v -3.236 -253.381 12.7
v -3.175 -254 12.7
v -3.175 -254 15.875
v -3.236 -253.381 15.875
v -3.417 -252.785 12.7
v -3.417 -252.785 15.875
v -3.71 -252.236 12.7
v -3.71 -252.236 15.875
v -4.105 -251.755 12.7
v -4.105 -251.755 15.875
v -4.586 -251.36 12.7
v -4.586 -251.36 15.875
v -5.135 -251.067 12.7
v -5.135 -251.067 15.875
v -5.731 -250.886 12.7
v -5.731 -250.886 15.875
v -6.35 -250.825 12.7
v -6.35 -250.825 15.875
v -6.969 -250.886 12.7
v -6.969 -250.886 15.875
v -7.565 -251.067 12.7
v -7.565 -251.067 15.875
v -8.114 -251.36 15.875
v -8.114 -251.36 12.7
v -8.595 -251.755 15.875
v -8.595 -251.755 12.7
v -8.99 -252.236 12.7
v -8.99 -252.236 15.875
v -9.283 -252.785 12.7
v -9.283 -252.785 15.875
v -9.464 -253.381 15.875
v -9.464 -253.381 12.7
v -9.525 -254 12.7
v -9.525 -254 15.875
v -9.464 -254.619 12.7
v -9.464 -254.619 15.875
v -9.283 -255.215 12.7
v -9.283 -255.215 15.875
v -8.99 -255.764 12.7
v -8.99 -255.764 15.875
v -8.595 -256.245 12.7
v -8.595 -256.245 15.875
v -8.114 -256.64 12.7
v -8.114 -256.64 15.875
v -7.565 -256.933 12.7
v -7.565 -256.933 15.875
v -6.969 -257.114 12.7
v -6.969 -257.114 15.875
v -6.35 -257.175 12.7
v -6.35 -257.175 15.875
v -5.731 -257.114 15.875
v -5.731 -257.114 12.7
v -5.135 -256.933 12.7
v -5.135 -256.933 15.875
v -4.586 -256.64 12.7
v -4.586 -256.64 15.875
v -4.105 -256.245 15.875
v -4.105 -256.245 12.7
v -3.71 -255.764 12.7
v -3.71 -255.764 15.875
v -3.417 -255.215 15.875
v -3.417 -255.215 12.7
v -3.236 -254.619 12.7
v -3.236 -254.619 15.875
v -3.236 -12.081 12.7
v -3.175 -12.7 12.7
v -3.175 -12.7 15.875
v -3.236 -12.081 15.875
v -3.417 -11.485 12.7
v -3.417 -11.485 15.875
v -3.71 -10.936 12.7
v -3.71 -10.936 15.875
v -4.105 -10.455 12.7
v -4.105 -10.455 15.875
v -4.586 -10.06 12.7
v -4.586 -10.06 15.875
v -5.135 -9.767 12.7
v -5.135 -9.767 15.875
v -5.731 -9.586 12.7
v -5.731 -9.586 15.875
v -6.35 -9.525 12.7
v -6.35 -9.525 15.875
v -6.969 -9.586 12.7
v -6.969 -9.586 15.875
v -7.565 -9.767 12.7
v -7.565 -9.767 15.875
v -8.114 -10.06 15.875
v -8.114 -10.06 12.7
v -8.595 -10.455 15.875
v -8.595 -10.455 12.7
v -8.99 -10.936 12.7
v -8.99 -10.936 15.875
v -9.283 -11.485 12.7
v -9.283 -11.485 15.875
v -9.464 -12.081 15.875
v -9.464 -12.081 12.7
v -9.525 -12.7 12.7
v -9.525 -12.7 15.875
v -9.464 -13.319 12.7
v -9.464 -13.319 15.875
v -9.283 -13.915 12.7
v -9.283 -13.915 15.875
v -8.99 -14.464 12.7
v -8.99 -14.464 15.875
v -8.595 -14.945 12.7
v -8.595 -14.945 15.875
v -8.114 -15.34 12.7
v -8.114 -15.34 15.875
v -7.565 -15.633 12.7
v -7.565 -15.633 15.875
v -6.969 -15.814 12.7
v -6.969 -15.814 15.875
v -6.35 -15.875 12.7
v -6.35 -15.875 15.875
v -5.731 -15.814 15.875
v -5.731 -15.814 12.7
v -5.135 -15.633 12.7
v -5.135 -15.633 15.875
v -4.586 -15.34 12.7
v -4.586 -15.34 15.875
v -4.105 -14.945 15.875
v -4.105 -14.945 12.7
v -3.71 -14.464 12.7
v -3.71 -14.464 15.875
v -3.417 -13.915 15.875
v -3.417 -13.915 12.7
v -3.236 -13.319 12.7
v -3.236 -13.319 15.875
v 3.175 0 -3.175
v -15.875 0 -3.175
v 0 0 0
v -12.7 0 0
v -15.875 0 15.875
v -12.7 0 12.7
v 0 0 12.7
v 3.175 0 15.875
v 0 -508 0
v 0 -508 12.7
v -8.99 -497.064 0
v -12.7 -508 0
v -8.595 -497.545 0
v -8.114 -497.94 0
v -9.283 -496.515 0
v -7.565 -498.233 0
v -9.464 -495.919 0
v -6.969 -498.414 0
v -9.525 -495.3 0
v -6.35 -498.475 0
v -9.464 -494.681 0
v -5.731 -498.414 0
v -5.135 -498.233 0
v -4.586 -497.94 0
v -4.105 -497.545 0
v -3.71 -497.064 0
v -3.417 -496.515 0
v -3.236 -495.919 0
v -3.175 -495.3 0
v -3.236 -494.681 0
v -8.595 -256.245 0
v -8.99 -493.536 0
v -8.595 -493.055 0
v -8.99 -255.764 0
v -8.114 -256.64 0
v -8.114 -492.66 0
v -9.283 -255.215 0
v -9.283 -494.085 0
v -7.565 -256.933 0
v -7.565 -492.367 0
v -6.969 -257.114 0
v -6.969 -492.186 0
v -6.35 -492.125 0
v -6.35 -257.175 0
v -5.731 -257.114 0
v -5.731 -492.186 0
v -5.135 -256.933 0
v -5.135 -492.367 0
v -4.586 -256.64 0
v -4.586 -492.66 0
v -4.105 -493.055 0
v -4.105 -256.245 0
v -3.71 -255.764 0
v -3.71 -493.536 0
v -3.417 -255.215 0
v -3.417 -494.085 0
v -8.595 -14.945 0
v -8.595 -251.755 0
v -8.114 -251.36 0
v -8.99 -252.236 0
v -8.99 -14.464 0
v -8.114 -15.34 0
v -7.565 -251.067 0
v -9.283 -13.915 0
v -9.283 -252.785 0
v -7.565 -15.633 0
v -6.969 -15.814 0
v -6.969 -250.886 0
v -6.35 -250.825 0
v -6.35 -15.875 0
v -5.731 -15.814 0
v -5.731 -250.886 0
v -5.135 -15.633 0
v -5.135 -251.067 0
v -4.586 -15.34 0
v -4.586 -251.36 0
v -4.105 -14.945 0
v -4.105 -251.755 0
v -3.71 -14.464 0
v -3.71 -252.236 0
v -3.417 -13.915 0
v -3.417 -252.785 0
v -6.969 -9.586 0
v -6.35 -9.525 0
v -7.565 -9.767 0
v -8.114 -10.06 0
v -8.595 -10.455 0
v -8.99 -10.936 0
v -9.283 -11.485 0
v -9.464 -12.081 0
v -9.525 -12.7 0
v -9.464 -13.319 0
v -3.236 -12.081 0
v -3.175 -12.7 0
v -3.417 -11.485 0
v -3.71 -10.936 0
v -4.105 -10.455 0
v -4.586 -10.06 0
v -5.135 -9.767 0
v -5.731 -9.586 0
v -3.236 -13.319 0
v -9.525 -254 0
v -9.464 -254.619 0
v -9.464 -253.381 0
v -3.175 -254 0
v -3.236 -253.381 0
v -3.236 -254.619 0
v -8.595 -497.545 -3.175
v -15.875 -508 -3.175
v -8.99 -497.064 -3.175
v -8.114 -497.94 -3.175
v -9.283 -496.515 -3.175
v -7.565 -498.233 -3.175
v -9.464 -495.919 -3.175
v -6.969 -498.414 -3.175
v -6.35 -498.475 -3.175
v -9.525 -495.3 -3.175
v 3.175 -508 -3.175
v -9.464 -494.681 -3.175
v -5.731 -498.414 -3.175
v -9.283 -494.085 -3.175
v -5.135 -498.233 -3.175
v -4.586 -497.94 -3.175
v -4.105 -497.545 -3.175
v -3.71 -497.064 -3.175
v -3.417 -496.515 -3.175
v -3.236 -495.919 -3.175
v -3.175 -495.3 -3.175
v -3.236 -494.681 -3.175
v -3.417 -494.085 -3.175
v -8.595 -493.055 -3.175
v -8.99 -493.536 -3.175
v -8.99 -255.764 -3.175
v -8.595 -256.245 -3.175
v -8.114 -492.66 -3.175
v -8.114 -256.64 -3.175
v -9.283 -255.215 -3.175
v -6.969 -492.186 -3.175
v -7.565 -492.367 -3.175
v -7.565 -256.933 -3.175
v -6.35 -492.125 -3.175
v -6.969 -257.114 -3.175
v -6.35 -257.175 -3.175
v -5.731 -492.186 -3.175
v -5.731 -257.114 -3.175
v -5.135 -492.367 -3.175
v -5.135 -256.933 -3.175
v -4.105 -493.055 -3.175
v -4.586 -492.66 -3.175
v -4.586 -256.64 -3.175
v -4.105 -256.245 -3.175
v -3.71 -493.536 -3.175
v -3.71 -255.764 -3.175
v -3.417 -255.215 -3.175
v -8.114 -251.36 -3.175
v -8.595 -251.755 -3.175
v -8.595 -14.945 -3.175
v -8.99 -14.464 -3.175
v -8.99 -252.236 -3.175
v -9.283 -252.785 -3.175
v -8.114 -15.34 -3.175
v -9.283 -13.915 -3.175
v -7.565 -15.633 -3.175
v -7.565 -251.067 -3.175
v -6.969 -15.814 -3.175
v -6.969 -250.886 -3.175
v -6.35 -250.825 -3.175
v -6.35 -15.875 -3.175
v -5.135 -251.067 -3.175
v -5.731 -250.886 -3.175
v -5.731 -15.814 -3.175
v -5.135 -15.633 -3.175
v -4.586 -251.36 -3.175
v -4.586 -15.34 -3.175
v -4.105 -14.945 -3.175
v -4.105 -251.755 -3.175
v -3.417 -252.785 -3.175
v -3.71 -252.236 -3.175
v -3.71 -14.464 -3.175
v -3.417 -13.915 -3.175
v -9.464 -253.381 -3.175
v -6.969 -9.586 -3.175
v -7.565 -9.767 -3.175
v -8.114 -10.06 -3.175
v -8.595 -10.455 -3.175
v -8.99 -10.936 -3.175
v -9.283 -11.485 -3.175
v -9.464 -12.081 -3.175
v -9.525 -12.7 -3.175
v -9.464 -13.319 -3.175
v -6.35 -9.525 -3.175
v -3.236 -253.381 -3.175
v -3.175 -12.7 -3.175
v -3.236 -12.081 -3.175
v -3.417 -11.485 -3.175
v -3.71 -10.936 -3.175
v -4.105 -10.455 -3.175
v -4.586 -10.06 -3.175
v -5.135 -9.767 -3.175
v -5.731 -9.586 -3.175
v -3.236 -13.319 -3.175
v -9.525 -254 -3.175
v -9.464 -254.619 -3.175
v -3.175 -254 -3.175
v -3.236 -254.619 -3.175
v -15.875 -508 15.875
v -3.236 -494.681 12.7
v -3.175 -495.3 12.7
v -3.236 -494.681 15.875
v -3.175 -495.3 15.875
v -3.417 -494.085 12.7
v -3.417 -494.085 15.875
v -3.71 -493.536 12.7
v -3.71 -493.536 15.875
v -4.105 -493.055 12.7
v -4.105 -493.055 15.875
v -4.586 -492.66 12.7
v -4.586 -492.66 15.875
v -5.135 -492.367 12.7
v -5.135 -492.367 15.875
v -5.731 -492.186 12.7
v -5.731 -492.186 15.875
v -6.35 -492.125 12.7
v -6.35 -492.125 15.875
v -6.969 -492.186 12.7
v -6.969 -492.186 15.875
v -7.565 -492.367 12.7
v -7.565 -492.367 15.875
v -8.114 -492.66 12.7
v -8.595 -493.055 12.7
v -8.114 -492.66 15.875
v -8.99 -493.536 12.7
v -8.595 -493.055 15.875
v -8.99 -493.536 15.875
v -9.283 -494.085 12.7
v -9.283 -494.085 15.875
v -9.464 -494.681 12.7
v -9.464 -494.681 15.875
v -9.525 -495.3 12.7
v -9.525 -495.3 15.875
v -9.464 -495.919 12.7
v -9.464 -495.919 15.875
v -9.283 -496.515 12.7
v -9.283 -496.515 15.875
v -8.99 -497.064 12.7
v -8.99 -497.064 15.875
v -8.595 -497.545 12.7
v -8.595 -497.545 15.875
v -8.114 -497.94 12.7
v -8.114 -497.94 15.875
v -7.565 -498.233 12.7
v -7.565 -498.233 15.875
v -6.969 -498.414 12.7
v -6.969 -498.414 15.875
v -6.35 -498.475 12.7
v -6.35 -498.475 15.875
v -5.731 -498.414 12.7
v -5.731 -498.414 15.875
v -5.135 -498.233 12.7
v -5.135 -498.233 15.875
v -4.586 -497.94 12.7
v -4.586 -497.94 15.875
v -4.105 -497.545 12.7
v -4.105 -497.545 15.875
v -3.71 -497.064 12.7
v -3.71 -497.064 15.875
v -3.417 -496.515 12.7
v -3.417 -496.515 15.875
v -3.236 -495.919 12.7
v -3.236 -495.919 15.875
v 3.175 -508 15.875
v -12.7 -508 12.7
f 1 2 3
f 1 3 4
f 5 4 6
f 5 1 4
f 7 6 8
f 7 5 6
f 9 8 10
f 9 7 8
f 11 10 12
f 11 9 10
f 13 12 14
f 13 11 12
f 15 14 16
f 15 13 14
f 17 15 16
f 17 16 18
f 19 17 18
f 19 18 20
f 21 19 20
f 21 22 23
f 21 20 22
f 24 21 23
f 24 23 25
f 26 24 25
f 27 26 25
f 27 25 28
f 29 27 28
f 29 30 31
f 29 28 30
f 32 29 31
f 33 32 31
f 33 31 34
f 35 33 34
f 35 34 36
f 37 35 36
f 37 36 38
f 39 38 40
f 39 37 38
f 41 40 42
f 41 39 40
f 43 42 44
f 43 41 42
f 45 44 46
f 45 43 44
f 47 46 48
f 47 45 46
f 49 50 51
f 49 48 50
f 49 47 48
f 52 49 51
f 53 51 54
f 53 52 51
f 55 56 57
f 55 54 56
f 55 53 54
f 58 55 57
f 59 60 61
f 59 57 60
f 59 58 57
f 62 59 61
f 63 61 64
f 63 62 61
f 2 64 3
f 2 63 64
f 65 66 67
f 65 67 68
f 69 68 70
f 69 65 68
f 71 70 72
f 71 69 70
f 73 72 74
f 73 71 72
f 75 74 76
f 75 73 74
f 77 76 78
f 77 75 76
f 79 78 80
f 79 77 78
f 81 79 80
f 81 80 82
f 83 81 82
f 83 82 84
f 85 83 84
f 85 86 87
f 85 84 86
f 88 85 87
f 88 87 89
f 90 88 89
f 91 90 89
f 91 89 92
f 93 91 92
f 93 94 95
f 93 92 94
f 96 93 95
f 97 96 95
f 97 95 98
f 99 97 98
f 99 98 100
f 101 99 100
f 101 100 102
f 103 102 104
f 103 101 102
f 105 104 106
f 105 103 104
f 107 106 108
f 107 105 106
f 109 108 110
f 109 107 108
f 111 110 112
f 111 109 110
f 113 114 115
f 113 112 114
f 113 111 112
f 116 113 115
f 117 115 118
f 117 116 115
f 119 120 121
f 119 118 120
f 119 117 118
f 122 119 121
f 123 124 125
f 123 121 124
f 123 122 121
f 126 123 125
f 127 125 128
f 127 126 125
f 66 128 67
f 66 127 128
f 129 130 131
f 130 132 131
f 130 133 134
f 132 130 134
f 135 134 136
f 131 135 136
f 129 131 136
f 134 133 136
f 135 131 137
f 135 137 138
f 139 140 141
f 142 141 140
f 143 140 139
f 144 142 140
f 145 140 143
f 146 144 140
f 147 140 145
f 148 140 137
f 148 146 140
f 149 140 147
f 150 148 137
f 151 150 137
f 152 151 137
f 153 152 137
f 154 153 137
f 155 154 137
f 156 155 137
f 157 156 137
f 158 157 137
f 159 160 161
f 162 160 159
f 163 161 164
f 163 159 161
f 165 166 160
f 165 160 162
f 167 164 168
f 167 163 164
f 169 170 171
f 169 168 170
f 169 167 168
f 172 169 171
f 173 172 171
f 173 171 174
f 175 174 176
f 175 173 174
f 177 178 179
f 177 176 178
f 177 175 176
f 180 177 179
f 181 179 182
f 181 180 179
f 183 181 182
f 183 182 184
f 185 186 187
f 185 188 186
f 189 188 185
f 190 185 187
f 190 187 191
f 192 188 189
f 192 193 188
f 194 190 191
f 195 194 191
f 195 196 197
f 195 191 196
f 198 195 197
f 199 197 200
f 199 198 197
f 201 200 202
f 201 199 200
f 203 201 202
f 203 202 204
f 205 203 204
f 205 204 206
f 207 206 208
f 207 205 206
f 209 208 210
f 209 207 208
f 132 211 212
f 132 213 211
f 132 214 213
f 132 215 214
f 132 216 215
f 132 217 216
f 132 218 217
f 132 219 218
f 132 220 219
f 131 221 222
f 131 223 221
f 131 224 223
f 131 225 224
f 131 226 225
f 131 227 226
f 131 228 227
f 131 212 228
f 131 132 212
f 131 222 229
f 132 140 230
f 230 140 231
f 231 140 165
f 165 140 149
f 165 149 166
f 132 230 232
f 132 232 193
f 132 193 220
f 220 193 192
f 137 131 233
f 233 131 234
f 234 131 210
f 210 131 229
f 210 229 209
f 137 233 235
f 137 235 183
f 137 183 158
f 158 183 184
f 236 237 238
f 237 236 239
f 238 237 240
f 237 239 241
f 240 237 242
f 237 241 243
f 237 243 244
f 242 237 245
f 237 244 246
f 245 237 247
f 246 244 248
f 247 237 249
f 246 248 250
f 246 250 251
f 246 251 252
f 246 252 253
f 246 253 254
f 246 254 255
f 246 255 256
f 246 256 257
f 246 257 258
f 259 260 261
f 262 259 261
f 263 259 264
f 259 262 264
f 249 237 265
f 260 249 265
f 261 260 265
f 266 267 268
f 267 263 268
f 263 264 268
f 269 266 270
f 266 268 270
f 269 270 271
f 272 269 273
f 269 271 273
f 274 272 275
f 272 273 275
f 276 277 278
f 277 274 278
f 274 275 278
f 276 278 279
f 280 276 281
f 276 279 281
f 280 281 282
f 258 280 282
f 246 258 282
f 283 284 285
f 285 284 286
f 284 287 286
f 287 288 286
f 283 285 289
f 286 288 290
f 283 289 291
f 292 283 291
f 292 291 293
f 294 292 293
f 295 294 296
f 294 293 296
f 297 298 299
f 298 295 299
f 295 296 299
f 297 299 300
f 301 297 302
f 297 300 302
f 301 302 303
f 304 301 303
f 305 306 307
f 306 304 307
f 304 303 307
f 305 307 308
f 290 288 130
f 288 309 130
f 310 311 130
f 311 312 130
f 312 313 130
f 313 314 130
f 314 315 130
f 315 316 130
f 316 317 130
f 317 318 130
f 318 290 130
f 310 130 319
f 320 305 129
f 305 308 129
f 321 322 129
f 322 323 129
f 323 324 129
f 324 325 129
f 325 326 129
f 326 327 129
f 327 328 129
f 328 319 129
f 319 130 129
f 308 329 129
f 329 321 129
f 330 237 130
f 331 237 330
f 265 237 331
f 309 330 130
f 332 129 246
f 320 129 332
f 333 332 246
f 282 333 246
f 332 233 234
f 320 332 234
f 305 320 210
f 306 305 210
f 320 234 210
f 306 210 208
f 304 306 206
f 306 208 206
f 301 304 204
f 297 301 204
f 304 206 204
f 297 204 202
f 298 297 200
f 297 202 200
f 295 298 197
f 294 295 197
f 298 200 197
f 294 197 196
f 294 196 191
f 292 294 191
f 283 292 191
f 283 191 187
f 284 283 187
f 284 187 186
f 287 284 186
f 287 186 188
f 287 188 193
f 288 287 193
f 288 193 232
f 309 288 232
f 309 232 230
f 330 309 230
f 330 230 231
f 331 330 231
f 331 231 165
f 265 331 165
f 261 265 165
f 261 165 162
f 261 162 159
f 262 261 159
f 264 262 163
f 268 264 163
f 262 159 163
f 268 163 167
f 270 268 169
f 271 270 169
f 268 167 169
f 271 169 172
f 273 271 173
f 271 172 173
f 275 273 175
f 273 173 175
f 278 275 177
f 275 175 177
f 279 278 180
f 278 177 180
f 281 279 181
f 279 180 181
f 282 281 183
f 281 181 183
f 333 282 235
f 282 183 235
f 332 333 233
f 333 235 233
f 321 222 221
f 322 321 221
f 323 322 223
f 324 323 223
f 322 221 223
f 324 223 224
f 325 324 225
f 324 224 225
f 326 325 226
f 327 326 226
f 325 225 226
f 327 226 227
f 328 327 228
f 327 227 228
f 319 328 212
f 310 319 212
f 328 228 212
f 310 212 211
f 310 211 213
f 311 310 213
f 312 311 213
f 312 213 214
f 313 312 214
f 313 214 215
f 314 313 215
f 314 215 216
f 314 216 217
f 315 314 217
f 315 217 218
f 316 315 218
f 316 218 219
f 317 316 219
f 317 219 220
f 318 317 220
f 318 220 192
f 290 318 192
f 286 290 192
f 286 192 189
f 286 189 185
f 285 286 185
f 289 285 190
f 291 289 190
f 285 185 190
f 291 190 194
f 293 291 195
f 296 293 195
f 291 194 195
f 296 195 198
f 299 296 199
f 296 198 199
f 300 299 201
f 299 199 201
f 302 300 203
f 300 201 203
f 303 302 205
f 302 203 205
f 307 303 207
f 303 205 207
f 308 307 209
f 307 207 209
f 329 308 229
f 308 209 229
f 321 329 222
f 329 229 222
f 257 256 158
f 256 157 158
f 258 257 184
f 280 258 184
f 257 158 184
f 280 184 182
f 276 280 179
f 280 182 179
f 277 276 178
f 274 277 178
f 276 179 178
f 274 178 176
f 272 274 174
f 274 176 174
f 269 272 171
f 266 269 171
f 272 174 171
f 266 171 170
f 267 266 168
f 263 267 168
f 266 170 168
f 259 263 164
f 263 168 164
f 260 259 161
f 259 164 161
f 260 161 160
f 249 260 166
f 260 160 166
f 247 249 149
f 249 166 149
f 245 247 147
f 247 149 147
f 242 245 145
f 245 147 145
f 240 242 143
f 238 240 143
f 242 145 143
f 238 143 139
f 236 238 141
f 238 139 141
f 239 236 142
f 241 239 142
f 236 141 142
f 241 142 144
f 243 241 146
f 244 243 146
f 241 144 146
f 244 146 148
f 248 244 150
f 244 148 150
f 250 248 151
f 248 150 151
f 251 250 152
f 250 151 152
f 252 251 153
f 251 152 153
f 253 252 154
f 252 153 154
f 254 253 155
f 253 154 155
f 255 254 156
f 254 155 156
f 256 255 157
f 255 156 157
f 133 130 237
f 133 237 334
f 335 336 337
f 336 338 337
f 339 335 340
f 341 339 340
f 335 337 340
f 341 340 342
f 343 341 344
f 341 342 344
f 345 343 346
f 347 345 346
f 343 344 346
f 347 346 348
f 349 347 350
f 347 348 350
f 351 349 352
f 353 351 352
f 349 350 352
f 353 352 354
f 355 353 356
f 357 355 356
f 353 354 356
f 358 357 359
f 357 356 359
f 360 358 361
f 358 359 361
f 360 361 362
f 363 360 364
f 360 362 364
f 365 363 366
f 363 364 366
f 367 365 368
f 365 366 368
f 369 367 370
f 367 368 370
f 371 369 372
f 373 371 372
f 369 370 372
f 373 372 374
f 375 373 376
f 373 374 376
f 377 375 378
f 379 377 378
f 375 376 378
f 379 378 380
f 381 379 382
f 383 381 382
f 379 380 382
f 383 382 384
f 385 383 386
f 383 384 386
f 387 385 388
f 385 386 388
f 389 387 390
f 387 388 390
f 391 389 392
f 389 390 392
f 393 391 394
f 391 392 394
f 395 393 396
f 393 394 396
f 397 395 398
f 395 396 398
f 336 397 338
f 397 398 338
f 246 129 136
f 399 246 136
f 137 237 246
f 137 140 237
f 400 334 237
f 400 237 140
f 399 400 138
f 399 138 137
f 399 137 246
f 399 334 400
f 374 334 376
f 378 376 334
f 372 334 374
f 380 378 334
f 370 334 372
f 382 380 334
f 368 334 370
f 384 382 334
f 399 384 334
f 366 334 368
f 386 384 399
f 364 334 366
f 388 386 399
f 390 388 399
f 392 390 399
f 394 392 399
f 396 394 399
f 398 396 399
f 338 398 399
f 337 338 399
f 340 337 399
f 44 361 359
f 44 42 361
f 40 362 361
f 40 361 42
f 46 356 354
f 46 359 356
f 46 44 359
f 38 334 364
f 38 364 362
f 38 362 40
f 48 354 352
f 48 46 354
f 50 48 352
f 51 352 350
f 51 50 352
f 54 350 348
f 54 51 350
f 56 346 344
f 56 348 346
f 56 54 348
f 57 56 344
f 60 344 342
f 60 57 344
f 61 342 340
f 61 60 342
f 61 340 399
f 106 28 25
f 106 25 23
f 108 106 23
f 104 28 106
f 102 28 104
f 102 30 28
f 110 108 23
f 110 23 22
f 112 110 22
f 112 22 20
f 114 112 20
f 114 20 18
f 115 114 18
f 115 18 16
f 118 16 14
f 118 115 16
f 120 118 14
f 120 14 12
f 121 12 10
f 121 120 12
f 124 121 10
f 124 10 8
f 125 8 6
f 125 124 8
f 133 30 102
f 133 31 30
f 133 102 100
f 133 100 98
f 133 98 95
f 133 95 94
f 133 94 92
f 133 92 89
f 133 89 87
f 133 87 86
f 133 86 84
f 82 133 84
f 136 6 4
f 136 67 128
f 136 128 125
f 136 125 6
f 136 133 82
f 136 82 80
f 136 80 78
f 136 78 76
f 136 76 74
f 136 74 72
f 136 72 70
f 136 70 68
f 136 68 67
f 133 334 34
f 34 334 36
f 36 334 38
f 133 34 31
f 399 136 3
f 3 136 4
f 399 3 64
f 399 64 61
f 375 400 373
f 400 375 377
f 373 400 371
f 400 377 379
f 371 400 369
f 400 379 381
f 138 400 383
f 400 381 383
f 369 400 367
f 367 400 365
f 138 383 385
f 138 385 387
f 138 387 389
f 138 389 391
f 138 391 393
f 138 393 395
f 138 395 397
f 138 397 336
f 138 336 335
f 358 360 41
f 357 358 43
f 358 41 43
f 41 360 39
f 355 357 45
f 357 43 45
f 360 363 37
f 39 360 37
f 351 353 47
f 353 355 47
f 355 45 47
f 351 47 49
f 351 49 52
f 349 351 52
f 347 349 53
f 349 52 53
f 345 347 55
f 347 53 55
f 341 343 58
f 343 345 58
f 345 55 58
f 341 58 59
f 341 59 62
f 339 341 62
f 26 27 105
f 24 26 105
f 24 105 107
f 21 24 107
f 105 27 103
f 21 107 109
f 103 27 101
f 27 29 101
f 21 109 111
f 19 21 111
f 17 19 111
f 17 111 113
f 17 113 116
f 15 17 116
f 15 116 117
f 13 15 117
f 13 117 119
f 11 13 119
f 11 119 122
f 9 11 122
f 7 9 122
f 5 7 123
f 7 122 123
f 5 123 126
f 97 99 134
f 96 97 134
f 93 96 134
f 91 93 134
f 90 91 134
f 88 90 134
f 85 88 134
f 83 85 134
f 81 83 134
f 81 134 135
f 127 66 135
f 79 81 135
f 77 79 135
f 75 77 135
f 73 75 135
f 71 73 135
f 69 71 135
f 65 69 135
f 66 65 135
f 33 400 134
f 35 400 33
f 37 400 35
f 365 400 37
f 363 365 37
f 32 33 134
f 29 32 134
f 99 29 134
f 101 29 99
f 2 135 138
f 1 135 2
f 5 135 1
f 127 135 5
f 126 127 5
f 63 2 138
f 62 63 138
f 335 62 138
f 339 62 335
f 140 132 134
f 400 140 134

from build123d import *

# Parameters (mm, degrees)
F0_W     = 19.05
F0_H     = 19.05
F0_W_2   = 12.7
F0_H_2   = 12.7
F1_DEPTH = 508
F2_R     = 3.175
F3_DEPTH = 63.5


with BuildPart() as f1:
    # F0 (on Front) → F1 (new body)
    with BuildSketch(Plane.XZ):
        with Locations((-6.35, 6.35)):
            Rectangle(F0_W, F0_H)
        with Locations((-6.35, 6.35)):
            Rectangle(F0_W_2, F0_H_2, mode=Mode.SUBTRACT)
    extrude(amount=F1_DEPTH)

    # F2 (on Top) → F3 (cut, symmetric)
    with BuildSketch(Plane.XY):
        with Locations((-6.35, -12.7)):
            Circle(F2_R)
        with Locations((-6.35, -254)):
            Circle(F2_R)
        with Locations((-6.35, -495.3)):
            Circle(F2_R)
    extrude(amount=F3_DEPTH, both=True, mode=Mode.SUBTRACT)


solid = f1.part
